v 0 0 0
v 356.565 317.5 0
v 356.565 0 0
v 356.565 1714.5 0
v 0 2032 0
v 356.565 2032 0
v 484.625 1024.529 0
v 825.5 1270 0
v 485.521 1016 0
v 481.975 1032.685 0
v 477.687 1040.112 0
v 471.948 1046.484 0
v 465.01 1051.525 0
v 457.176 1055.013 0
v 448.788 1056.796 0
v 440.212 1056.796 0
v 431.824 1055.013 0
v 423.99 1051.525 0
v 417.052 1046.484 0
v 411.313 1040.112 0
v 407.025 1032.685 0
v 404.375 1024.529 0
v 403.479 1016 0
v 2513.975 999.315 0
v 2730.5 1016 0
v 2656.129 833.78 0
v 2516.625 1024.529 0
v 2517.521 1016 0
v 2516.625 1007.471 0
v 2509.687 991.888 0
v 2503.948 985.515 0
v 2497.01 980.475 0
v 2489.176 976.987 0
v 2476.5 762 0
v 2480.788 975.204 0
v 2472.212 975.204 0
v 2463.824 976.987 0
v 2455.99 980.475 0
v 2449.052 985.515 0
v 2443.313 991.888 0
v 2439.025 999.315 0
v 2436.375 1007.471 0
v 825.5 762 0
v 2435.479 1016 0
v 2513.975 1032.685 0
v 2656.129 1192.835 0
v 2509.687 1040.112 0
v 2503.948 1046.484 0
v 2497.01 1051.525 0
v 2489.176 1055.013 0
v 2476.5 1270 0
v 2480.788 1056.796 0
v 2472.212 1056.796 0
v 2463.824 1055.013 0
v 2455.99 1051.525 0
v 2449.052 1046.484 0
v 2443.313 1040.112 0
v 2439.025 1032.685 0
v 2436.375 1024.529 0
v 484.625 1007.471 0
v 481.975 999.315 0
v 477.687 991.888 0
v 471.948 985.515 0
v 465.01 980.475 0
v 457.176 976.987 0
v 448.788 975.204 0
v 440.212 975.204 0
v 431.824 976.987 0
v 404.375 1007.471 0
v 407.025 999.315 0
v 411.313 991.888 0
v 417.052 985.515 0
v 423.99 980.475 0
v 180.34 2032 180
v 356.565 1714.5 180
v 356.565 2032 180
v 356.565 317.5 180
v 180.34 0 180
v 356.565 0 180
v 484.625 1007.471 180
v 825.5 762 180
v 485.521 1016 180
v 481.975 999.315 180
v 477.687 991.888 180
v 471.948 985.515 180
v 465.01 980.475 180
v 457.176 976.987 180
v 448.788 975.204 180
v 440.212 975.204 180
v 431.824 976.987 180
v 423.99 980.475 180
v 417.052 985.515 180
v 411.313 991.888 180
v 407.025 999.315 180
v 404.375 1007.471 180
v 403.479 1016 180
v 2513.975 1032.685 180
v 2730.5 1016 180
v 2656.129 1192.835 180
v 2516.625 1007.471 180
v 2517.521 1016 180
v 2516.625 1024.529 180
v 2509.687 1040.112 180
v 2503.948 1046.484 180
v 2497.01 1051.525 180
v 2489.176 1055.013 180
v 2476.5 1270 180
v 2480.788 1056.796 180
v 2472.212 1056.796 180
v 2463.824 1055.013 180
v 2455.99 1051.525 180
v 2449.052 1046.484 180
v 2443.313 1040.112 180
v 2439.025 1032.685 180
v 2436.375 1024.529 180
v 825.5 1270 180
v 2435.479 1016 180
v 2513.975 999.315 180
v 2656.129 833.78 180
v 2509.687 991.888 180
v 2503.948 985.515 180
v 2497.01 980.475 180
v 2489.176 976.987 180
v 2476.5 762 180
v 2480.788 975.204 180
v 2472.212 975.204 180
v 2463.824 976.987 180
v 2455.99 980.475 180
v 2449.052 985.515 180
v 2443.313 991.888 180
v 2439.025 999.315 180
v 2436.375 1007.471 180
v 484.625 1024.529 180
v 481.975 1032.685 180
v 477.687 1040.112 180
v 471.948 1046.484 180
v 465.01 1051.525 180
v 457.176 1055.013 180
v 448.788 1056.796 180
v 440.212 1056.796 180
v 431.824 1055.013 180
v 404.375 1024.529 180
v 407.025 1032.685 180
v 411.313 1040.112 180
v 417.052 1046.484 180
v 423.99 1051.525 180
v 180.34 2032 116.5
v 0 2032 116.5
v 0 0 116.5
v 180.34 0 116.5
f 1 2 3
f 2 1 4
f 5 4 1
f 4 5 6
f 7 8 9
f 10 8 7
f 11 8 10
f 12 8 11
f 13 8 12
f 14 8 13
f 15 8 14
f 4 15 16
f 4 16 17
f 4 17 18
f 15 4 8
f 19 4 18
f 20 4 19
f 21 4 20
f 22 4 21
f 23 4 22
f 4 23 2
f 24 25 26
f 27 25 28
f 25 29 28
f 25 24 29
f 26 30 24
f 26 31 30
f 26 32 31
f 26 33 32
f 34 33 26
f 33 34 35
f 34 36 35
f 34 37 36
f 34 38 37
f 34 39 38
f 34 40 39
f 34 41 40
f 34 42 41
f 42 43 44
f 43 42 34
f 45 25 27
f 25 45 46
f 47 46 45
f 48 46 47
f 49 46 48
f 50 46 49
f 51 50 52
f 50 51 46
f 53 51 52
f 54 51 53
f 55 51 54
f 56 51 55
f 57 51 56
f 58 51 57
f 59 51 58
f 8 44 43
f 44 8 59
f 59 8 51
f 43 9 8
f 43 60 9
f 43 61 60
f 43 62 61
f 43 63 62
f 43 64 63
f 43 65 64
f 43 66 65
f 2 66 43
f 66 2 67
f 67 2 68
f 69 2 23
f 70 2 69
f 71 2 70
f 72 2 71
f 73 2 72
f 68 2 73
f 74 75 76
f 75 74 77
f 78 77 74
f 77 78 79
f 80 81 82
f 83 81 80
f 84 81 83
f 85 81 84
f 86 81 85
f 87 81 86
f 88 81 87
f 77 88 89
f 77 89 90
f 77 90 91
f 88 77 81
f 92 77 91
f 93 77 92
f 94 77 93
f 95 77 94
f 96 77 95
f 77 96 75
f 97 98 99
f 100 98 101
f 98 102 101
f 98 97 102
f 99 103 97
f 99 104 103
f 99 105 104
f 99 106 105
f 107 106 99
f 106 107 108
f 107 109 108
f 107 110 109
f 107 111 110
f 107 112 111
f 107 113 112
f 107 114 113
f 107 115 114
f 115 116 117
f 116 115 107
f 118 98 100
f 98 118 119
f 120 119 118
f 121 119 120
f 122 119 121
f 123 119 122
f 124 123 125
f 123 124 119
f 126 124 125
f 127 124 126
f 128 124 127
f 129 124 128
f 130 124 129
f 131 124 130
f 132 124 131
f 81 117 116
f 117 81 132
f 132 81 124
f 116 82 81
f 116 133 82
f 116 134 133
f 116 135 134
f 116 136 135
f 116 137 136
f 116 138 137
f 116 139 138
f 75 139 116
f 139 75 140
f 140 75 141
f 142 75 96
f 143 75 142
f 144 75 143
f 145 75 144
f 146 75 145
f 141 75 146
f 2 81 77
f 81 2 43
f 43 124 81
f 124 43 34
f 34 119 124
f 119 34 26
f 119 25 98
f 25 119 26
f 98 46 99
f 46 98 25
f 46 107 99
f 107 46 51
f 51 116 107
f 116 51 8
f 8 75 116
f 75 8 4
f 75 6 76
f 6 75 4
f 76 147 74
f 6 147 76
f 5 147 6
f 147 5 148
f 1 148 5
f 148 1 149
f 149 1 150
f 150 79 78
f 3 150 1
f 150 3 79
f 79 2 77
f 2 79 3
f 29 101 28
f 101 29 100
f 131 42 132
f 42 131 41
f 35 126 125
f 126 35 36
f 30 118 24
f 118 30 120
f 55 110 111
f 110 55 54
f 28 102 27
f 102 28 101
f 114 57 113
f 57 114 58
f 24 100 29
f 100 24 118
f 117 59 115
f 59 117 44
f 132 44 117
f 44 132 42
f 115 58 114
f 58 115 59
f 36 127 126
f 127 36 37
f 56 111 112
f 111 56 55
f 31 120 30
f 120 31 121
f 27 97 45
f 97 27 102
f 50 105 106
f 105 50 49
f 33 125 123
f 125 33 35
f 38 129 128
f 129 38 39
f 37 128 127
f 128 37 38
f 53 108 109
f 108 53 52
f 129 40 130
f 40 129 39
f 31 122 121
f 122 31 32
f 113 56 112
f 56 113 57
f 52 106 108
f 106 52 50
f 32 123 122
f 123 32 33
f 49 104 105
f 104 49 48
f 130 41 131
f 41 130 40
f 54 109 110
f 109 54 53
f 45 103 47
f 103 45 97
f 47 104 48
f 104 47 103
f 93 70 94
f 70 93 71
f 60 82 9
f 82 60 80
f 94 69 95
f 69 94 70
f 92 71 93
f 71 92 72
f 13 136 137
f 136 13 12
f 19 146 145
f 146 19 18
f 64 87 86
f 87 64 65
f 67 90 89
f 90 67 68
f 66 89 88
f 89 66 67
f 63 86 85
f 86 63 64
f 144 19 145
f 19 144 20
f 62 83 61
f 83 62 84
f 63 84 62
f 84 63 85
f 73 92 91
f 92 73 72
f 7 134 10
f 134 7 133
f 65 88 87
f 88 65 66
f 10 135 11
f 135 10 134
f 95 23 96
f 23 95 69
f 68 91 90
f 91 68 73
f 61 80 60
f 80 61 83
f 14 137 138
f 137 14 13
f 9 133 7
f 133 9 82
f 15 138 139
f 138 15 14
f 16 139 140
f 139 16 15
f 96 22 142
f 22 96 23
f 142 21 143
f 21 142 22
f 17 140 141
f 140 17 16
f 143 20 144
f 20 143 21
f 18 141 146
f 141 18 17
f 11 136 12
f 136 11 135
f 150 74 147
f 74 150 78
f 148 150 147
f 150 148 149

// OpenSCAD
// file: global_constants.scad
// unit = 0.1 mm
// 1 inch = 25.4 mm = 254 units

// Dimensions

// Sheet dimensions
sheet_x=24400;
sheet_y=12200;
sheet_z=180;

// Circular cnc routing holes
cnc_circle_r=31.750;
module routing_circle(x,y){
  translate([x,y]) linear_extrude(height=sheet_z) circle(cnc_circle_r);
}

bolt_circle_r=41.0210;
module bolt_circle(x,y){
  translate([x,y]) linear_extrude(height=sheet_z) circle(bolt_circle_r);
}

//Conversion
medievaltometric=254;
metrictomedieval=.0039370078;

// Use the metric system by default
// units="medieval";
units="metric";
// main file
// To render the DXF file from the command line:
// openscad -x cradle_lift_arm.dxf -D'units="metric"' cradle_lift_arm.scad

include <global_constants.scad>;

// outside dimensions
x1=180.34;//.71"
x2=356.5652;//1.4038
x3=825.5;//3.25"
x4=2476.5;//9.75"
x5=2656.1288;//10.4572"
x6=2730.5;//10.75"
x7=444.5;//1.75"
y1=317.5;//1.25"
y2=762;//3"
y3=833.7804;//3.2826"
y4=1016;//4"
y5=1192.8348;//4.6962"
y6=1270;//5"
y7=1714.5;//6.75"
y8=2032;//8"

z1=63.5;//.25"

render(convexity=10){
  difference(){
    linear_extrude(height=sheet_z) polygon([[0,0],[x1,0],[x2,0],[x2,y1],[x3,y2],[x4,y2],[x5,y3],[x6,y4],[x5,y5],[x4,y6],[x3,y6],[x2,y7],[x2,y8],[x1,y8],[0,y8],[0,0]]);
    bolt_circle(x4,y4);
    bolt_circle(x7,y4);
    translate([0,0,sheet_z-z1]) cube([x1,y8,z1]);
  }
}
